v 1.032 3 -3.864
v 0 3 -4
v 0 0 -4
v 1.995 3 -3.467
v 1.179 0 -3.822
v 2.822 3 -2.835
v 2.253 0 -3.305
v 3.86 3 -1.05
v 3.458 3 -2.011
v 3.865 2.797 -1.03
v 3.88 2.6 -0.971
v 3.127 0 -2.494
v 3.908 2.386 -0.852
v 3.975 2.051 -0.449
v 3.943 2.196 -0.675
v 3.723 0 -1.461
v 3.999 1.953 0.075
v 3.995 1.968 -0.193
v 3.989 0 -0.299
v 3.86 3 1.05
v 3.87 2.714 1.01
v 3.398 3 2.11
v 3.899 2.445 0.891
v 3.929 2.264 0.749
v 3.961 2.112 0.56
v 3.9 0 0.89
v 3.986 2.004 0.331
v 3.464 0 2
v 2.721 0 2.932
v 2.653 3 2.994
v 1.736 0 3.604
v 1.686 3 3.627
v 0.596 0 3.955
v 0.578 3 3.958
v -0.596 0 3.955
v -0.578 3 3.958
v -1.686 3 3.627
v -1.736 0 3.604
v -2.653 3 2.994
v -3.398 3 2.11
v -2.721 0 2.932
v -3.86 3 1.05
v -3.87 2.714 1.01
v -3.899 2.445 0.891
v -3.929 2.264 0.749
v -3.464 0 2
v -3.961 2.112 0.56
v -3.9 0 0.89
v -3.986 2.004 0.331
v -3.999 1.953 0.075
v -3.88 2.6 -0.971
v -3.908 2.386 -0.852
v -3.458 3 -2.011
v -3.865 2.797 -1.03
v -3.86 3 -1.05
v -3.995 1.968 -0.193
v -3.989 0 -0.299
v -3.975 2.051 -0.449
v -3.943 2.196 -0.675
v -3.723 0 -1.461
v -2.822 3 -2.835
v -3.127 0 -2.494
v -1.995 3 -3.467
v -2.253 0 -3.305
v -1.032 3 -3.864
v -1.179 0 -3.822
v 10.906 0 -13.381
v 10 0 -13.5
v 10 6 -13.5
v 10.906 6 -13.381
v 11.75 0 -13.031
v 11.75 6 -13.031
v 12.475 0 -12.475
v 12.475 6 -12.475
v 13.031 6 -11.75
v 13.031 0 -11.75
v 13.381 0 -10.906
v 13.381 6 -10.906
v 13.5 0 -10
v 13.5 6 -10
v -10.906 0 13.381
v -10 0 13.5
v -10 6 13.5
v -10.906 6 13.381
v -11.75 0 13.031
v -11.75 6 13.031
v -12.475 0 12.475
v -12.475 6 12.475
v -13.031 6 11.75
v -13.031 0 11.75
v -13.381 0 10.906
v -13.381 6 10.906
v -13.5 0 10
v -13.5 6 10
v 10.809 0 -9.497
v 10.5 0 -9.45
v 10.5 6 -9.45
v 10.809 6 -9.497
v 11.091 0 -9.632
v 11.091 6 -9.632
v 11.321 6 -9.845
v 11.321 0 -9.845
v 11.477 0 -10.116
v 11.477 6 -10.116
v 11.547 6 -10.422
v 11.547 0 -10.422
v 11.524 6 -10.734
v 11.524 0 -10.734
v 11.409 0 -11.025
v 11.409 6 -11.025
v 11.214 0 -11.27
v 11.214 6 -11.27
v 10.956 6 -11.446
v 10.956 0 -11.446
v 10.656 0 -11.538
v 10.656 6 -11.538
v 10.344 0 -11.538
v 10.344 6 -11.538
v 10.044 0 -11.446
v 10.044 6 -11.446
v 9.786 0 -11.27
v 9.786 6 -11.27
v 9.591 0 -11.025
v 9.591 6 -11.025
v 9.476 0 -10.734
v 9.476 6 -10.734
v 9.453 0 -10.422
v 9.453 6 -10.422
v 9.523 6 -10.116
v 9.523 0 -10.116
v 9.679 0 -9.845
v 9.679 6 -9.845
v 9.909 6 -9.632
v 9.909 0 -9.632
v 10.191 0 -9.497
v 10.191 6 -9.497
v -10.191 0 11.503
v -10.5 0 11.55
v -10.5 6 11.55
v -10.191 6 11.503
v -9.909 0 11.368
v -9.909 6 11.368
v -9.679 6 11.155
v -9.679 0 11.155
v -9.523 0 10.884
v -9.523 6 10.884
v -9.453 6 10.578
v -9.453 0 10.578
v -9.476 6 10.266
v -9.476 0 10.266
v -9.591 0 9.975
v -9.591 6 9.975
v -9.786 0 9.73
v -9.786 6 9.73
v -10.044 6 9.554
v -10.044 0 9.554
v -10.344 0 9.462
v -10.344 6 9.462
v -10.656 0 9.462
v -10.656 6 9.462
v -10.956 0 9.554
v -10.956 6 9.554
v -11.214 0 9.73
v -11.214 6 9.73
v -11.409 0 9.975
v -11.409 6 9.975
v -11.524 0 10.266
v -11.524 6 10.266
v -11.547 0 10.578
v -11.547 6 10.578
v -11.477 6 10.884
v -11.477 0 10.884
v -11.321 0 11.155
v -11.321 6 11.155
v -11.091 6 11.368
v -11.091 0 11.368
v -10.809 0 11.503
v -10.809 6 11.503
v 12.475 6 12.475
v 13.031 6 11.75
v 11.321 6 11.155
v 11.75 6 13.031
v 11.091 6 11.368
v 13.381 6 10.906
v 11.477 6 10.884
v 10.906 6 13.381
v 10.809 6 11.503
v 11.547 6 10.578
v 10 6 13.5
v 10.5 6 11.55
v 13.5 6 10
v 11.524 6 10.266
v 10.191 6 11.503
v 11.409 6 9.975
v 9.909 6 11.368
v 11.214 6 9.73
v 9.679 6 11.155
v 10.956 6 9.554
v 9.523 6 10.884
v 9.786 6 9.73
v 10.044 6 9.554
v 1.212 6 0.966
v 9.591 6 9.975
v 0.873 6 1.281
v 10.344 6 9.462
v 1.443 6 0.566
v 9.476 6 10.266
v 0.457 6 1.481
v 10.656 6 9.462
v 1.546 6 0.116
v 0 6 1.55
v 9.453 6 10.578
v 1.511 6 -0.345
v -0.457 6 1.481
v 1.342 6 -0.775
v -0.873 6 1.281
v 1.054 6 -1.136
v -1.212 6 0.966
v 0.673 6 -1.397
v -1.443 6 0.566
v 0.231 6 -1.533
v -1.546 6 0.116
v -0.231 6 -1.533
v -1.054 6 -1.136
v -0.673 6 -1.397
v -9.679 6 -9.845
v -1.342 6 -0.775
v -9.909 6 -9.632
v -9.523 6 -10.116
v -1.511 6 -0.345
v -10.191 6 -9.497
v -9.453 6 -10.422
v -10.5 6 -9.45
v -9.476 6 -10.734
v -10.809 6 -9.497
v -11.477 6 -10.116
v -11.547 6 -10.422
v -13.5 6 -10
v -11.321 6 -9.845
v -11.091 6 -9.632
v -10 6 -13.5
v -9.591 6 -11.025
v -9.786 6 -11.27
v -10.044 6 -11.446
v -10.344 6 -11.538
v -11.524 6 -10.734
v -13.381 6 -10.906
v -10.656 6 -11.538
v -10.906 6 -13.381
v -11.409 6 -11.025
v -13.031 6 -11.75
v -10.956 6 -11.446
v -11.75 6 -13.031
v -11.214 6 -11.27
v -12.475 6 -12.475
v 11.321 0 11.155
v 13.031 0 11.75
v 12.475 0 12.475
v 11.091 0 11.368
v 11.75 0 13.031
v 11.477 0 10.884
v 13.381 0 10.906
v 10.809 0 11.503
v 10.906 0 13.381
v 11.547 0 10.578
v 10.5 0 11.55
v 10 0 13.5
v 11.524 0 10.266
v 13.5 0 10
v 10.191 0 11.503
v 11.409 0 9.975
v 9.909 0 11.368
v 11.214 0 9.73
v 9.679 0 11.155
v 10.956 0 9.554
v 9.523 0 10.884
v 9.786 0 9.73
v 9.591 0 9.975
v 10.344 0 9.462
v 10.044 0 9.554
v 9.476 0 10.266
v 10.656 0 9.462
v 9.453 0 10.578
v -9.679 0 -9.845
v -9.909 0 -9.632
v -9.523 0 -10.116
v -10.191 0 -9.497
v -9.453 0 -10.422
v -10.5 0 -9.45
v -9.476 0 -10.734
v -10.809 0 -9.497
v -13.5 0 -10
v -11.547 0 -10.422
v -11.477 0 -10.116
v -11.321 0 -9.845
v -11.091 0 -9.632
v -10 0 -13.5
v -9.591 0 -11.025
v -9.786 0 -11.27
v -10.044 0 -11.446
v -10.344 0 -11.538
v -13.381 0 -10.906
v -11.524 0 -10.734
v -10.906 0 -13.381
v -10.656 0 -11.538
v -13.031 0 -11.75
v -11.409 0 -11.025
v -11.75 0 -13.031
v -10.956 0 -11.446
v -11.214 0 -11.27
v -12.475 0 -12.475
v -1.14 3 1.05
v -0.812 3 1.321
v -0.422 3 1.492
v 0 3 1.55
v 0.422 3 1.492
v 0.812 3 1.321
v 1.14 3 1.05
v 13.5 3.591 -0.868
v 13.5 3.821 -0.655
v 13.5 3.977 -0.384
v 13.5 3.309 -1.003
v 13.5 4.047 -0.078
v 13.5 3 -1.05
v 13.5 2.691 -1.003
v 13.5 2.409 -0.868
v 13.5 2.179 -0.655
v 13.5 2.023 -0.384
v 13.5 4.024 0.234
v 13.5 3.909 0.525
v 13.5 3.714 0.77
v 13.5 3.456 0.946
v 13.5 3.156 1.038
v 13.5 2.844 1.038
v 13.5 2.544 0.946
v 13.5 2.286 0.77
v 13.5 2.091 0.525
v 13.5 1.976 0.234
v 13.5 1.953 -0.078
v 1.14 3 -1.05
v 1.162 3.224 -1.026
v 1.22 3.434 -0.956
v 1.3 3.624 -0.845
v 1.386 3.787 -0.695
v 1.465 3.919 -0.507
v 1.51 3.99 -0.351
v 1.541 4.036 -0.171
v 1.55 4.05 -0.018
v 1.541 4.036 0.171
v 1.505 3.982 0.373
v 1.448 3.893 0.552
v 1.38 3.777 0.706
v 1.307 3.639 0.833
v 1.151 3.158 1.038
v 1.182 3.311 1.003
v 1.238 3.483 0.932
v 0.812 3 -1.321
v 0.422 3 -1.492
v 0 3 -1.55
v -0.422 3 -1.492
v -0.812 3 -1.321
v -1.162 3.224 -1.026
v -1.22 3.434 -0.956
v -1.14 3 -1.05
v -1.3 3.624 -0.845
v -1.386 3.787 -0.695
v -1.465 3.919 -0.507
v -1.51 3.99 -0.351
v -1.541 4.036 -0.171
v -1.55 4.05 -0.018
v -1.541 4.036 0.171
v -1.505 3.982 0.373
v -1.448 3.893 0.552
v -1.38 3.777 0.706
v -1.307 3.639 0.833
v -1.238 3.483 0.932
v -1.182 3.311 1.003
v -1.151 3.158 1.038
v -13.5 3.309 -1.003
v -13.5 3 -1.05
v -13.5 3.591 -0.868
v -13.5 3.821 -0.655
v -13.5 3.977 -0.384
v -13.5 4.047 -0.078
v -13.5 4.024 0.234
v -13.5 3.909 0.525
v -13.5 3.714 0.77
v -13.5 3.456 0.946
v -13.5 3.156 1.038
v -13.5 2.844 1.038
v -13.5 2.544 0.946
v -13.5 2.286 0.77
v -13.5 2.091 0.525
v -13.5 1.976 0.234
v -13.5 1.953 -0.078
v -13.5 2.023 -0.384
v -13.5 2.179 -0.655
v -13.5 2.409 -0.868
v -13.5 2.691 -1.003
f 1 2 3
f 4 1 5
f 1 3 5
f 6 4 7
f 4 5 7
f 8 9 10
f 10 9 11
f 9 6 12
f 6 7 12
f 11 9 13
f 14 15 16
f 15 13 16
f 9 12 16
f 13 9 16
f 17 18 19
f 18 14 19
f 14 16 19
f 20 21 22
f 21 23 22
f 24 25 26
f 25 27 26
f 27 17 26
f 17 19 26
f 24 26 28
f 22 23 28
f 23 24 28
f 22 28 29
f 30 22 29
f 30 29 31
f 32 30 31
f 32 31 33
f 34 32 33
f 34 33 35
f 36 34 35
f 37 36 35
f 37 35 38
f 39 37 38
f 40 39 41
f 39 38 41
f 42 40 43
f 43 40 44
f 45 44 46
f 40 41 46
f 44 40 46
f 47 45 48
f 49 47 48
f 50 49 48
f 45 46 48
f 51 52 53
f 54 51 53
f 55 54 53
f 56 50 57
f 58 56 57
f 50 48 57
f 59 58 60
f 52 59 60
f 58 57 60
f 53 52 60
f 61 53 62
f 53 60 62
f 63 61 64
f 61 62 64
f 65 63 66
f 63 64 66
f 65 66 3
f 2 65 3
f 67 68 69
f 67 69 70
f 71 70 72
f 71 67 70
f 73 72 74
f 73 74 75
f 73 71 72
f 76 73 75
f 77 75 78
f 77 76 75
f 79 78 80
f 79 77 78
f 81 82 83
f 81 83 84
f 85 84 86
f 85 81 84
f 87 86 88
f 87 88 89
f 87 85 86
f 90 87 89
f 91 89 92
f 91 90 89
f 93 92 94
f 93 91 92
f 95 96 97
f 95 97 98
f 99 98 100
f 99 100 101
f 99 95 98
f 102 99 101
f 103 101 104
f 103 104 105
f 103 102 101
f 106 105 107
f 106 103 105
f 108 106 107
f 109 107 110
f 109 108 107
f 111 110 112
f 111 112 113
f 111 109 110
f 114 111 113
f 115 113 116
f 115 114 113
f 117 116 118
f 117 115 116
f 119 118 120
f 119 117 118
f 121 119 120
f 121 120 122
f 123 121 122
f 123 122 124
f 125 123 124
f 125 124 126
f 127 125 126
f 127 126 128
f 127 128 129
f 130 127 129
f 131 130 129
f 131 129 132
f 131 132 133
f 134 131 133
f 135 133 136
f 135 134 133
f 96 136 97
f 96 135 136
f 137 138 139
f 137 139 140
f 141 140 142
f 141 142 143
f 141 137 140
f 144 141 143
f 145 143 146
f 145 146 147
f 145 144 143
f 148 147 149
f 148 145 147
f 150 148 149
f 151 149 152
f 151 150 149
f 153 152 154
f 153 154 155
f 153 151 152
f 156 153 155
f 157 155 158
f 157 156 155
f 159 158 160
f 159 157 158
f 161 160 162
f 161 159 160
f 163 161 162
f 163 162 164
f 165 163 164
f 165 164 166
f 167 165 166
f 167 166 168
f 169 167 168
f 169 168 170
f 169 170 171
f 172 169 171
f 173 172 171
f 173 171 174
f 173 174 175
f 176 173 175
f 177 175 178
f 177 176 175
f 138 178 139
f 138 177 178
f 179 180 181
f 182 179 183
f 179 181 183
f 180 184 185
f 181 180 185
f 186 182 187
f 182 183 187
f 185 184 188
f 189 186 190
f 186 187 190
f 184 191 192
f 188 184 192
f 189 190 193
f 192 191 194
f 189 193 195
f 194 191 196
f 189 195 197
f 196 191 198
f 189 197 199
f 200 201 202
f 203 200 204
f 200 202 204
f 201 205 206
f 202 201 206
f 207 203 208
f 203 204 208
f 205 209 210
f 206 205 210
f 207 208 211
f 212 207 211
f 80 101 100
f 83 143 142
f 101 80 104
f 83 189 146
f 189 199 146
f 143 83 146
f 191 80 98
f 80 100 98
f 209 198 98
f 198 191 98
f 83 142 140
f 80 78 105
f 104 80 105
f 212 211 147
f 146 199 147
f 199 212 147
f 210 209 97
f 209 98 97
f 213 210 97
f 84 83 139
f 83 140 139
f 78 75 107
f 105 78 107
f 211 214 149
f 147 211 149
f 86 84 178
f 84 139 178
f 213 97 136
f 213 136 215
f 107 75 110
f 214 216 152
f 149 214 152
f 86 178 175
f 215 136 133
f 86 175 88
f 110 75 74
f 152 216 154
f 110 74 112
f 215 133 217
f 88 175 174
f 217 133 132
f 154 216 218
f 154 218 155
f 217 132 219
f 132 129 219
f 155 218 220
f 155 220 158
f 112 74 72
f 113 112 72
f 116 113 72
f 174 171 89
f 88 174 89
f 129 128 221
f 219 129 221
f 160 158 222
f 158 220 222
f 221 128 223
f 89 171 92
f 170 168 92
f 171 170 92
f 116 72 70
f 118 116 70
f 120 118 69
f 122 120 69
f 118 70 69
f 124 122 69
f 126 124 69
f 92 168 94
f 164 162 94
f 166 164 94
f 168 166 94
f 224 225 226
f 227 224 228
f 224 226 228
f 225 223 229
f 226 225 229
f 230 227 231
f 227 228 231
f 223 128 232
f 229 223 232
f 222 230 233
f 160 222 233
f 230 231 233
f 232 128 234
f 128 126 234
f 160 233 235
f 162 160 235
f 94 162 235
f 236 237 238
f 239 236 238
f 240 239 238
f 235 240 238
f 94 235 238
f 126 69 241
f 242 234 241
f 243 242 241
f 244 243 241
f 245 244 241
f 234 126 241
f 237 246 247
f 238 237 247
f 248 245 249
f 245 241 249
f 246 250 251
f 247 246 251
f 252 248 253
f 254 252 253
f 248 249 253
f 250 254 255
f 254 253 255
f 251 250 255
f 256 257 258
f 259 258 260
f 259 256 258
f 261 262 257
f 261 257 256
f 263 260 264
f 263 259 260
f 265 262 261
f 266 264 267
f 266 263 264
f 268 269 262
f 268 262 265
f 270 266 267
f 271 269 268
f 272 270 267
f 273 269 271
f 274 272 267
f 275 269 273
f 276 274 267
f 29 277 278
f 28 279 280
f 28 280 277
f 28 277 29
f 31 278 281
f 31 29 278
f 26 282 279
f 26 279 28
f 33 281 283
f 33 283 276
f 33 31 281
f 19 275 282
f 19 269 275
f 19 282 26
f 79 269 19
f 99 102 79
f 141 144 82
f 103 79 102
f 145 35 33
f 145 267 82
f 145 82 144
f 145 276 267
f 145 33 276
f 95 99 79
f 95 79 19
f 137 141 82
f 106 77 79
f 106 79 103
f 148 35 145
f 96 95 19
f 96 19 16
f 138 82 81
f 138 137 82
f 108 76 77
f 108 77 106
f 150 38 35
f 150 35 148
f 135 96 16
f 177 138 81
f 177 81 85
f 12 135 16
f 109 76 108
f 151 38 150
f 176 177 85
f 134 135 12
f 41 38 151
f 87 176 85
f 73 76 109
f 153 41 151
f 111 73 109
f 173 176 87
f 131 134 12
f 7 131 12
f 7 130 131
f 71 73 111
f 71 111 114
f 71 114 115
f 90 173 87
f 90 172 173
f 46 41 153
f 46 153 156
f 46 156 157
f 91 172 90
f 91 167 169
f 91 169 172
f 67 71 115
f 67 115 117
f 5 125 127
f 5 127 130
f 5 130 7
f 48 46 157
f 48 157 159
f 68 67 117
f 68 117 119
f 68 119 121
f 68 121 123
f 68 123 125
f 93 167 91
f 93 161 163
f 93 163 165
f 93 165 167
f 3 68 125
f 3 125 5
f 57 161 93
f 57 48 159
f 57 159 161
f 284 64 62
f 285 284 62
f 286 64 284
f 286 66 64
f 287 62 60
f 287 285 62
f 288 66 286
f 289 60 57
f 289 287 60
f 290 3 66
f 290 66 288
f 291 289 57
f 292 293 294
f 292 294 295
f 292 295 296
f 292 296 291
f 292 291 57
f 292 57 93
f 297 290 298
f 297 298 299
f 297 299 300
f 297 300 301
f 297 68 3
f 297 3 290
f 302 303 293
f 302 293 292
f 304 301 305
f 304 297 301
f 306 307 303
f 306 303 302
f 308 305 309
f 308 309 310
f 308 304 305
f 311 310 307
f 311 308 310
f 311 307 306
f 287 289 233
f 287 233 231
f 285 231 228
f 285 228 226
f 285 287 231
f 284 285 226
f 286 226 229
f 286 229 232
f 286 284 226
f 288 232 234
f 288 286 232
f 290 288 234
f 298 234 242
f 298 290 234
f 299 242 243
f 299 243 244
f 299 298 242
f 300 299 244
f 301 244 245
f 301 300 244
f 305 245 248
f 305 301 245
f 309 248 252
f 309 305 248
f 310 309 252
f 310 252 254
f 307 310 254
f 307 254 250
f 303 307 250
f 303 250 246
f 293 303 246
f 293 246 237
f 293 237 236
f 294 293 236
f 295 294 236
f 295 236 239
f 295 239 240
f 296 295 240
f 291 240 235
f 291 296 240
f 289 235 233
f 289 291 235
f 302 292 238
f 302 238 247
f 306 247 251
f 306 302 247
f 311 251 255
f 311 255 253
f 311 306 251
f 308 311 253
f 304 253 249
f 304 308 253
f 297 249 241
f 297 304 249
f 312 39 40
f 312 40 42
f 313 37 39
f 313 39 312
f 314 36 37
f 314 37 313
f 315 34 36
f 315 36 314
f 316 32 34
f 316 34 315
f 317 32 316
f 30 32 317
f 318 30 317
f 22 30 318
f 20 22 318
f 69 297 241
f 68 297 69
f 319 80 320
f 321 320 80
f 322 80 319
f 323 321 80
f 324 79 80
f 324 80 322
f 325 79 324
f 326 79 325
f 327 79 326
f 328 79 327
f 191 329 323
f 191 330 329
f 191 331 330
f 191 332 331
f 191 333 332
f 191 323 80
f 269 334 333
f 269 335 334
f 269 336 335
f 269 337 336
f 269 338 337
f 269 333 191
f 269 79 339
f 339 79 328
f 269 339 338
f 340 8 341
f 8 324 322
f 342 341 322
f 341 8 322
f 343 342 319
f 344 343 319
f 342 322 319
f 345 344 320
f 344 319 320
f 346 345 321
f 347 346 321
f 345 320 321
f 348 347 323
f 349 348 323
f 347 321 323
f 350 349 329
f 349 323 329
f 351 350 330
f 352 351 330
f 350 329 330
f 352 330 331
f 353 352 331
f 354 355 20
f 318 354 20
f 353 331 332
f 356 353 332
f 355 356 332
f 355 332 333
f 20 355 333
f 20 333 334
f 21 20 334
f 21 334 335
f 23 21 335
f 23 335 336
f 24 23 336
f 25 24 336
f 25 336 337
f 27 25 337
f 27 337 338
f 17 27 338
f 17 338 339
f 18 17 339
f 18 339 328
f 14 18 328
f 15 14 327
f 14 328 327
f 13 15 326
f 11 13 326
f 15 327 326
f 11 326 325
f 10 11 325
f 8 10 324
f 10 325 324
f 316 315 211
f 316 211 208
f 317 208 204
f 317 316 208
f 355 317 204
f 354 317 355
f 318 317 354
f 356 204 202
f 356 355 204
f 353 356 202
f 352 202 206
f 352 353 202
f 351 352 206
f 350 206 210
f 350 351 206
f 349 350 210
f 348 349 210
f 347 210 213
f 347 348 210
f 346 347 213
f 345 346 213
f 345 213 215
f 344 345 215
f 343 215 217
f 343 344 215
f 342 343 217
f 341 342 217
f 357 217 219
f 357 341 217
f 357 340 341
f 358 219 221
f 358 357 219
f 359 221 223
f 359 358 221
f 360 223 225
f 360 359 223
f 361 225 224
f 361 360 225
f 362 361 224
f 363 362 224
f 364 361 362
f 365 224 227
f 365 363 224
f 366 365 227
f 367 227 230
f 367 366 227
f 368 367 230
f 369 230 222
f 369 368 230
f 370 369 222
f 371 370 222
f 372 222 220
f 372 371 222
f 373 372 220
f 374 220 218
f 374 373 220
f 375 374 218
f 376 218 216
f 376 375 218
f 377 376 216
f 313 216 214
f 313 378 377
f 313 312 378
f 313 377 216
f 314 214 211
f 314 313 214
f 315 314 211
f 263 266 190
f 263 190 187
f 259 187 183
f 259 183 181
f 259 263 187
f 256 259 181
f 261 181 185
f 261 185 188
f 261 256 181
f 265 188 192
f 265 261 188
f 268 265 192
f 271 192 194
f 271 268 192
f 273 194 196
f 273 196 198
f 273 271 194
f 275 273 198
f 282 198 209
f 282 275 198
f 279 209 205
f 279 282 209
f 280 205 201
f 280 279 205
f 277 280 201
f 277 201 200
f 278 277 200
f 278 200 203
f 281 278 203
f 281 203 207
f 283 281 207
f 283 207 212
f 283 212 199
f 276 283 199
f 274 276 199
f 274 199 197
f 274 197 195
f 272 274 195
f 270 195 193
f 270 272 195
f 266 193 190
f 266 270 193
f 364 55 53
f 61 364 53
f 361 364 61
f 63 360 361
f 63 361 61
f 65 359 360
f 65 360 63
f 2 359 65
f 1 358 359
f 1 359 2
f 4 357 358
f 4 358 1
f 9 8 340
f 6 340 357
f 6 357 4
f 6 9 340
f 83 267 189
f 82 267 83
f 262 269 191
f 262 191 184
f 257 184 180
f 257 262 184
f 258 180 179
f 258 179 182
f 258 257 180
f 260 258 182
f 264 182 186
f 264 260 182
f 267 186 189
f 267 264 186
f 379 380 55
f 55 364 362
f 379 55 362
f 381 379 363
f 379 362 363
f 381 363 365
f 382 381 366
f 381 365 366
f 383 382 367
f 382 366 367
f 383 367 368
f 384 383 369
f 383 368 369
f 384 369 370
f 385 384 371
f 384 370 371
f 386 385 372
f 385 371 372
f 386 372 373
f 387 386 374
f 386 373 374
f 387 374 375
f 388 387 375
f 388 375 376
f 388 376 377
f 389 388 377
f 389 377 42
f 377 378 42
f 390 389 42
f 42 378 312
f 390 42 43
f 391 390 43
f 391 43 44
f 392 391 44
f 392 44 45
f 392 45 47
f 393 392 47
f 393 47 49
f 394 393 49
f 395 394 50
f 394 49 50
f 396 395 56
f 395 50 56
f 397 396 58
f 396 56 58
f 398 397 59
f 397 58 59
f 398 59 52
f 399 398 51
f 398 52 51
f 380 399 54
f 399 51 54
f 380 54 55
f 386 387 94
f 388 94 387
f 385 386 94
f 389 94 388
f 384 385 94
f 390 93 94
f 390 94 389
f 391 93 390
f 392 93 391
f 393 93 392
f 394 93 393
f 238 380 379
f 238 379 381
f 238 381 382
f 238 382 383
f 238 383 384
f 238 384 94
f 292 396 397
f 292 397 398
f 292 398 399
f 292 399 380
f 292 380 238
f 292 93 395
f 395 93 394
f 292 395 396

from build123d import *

# Parameters (mm, degrees)
SKETCH_1_R          = 1.55
SKETCH_1_R_2        = 1.05
EXTRUDE_1_DEPTH     = 6
SKETCH_2_R          = 1.05
CUT_EXTRUDE_1_DEPTH = 31.777426793
SKETCH_3_R          = 4
CUT_EXTRUDE_2_DEPTH = 3


with BuildPart() as part:
    # ｽｹｯﾁ1 → ﾎﾞｽ - 押し出し1 (new body)
    with BuildSketch(Plane(origin=(0, 0, 0), x_dir=(1, 0, 0), z_dir=(0, 1, 0))):
        with BuildLine():
            Line((-10, 13.5), (10, 13.5))
            ThreePointArc((10, 13.5), (12.474873734, 12.474873734), (13.5, 10))
            Line((13.5, 10), (13.5, -10))
            ThreePointArc((13.5, -10), (12.474873734, -12.474873734), (10, -13.5))
            Line((10, -13.5), (-10, -13.5))
            ThreePointArc((-10, -13.5), (-12.474873734, -12.474873734), (-13.5, -10))
            Line((-13.5, -10), (-13.5, 10))
            ThreePointArc((-13.5, 10), (-12.474873734, 12.474873734), (-10, 13.5))
        make_face()
        with Locations(Location((0, 0, 0), (0, 0, 270))):
            Circle(SKETCH_1_R, mode=Mode.SUBTRACT)
        with Locations(Location((-10.5, -10.5, 0), (0, 0, 270))):
            Circle(SKETCH_1_R_2, mode=Mode.SUBTRACT)
        with Locations(Location((10.5, -10.5, 0), (0, 0, 270))):
            Circle(SKETCH_1_R_2, mode=Mode.SUBTRACT)
        with Locations(Location((10.5, 10.5, 0), (0, 0, 270))):
            Circle(SKETCH_1_R_2, mode=Mode.SUBTRACT)
        with Locations(Location((-10.5, 10.5, 0), (0, 0, 270))):
            Circle(SKETCH_1_R_2, mode=Mode.SUBTRACT)
    extrude(amount=EXTRUDE_1_DEPTH)

    # ｽｹｯﾁ2 → ｶｯﾄ - 押し出し1 (cut, through all)
    with BuildSketch(Plane(origin=(13.5, 0, 0), x_dir=(0, 0, -1), z_dir=(1, 0, 0))):
        with Locations((0, 3)):
            Circle(SKETCH_2_R)
    extrude(amount=-CUT_EXTRUDE_1_DEPTH, mode=Mode.SUBTRACT)

    # ｽｹｯﾁ3 → ｶｯﾄ - 押し出し2 (cut)
    with BuildSketch(Plane.XZ):
        with Locations(Location((0, 0, 0), (0, 0, 270))):
            Circle(SKETCH_3_R)
    extrude(amount=-CUT_EXTRUDE_2_DEPTH, mode=Mode.SUBTRACT)


solid = part.part
